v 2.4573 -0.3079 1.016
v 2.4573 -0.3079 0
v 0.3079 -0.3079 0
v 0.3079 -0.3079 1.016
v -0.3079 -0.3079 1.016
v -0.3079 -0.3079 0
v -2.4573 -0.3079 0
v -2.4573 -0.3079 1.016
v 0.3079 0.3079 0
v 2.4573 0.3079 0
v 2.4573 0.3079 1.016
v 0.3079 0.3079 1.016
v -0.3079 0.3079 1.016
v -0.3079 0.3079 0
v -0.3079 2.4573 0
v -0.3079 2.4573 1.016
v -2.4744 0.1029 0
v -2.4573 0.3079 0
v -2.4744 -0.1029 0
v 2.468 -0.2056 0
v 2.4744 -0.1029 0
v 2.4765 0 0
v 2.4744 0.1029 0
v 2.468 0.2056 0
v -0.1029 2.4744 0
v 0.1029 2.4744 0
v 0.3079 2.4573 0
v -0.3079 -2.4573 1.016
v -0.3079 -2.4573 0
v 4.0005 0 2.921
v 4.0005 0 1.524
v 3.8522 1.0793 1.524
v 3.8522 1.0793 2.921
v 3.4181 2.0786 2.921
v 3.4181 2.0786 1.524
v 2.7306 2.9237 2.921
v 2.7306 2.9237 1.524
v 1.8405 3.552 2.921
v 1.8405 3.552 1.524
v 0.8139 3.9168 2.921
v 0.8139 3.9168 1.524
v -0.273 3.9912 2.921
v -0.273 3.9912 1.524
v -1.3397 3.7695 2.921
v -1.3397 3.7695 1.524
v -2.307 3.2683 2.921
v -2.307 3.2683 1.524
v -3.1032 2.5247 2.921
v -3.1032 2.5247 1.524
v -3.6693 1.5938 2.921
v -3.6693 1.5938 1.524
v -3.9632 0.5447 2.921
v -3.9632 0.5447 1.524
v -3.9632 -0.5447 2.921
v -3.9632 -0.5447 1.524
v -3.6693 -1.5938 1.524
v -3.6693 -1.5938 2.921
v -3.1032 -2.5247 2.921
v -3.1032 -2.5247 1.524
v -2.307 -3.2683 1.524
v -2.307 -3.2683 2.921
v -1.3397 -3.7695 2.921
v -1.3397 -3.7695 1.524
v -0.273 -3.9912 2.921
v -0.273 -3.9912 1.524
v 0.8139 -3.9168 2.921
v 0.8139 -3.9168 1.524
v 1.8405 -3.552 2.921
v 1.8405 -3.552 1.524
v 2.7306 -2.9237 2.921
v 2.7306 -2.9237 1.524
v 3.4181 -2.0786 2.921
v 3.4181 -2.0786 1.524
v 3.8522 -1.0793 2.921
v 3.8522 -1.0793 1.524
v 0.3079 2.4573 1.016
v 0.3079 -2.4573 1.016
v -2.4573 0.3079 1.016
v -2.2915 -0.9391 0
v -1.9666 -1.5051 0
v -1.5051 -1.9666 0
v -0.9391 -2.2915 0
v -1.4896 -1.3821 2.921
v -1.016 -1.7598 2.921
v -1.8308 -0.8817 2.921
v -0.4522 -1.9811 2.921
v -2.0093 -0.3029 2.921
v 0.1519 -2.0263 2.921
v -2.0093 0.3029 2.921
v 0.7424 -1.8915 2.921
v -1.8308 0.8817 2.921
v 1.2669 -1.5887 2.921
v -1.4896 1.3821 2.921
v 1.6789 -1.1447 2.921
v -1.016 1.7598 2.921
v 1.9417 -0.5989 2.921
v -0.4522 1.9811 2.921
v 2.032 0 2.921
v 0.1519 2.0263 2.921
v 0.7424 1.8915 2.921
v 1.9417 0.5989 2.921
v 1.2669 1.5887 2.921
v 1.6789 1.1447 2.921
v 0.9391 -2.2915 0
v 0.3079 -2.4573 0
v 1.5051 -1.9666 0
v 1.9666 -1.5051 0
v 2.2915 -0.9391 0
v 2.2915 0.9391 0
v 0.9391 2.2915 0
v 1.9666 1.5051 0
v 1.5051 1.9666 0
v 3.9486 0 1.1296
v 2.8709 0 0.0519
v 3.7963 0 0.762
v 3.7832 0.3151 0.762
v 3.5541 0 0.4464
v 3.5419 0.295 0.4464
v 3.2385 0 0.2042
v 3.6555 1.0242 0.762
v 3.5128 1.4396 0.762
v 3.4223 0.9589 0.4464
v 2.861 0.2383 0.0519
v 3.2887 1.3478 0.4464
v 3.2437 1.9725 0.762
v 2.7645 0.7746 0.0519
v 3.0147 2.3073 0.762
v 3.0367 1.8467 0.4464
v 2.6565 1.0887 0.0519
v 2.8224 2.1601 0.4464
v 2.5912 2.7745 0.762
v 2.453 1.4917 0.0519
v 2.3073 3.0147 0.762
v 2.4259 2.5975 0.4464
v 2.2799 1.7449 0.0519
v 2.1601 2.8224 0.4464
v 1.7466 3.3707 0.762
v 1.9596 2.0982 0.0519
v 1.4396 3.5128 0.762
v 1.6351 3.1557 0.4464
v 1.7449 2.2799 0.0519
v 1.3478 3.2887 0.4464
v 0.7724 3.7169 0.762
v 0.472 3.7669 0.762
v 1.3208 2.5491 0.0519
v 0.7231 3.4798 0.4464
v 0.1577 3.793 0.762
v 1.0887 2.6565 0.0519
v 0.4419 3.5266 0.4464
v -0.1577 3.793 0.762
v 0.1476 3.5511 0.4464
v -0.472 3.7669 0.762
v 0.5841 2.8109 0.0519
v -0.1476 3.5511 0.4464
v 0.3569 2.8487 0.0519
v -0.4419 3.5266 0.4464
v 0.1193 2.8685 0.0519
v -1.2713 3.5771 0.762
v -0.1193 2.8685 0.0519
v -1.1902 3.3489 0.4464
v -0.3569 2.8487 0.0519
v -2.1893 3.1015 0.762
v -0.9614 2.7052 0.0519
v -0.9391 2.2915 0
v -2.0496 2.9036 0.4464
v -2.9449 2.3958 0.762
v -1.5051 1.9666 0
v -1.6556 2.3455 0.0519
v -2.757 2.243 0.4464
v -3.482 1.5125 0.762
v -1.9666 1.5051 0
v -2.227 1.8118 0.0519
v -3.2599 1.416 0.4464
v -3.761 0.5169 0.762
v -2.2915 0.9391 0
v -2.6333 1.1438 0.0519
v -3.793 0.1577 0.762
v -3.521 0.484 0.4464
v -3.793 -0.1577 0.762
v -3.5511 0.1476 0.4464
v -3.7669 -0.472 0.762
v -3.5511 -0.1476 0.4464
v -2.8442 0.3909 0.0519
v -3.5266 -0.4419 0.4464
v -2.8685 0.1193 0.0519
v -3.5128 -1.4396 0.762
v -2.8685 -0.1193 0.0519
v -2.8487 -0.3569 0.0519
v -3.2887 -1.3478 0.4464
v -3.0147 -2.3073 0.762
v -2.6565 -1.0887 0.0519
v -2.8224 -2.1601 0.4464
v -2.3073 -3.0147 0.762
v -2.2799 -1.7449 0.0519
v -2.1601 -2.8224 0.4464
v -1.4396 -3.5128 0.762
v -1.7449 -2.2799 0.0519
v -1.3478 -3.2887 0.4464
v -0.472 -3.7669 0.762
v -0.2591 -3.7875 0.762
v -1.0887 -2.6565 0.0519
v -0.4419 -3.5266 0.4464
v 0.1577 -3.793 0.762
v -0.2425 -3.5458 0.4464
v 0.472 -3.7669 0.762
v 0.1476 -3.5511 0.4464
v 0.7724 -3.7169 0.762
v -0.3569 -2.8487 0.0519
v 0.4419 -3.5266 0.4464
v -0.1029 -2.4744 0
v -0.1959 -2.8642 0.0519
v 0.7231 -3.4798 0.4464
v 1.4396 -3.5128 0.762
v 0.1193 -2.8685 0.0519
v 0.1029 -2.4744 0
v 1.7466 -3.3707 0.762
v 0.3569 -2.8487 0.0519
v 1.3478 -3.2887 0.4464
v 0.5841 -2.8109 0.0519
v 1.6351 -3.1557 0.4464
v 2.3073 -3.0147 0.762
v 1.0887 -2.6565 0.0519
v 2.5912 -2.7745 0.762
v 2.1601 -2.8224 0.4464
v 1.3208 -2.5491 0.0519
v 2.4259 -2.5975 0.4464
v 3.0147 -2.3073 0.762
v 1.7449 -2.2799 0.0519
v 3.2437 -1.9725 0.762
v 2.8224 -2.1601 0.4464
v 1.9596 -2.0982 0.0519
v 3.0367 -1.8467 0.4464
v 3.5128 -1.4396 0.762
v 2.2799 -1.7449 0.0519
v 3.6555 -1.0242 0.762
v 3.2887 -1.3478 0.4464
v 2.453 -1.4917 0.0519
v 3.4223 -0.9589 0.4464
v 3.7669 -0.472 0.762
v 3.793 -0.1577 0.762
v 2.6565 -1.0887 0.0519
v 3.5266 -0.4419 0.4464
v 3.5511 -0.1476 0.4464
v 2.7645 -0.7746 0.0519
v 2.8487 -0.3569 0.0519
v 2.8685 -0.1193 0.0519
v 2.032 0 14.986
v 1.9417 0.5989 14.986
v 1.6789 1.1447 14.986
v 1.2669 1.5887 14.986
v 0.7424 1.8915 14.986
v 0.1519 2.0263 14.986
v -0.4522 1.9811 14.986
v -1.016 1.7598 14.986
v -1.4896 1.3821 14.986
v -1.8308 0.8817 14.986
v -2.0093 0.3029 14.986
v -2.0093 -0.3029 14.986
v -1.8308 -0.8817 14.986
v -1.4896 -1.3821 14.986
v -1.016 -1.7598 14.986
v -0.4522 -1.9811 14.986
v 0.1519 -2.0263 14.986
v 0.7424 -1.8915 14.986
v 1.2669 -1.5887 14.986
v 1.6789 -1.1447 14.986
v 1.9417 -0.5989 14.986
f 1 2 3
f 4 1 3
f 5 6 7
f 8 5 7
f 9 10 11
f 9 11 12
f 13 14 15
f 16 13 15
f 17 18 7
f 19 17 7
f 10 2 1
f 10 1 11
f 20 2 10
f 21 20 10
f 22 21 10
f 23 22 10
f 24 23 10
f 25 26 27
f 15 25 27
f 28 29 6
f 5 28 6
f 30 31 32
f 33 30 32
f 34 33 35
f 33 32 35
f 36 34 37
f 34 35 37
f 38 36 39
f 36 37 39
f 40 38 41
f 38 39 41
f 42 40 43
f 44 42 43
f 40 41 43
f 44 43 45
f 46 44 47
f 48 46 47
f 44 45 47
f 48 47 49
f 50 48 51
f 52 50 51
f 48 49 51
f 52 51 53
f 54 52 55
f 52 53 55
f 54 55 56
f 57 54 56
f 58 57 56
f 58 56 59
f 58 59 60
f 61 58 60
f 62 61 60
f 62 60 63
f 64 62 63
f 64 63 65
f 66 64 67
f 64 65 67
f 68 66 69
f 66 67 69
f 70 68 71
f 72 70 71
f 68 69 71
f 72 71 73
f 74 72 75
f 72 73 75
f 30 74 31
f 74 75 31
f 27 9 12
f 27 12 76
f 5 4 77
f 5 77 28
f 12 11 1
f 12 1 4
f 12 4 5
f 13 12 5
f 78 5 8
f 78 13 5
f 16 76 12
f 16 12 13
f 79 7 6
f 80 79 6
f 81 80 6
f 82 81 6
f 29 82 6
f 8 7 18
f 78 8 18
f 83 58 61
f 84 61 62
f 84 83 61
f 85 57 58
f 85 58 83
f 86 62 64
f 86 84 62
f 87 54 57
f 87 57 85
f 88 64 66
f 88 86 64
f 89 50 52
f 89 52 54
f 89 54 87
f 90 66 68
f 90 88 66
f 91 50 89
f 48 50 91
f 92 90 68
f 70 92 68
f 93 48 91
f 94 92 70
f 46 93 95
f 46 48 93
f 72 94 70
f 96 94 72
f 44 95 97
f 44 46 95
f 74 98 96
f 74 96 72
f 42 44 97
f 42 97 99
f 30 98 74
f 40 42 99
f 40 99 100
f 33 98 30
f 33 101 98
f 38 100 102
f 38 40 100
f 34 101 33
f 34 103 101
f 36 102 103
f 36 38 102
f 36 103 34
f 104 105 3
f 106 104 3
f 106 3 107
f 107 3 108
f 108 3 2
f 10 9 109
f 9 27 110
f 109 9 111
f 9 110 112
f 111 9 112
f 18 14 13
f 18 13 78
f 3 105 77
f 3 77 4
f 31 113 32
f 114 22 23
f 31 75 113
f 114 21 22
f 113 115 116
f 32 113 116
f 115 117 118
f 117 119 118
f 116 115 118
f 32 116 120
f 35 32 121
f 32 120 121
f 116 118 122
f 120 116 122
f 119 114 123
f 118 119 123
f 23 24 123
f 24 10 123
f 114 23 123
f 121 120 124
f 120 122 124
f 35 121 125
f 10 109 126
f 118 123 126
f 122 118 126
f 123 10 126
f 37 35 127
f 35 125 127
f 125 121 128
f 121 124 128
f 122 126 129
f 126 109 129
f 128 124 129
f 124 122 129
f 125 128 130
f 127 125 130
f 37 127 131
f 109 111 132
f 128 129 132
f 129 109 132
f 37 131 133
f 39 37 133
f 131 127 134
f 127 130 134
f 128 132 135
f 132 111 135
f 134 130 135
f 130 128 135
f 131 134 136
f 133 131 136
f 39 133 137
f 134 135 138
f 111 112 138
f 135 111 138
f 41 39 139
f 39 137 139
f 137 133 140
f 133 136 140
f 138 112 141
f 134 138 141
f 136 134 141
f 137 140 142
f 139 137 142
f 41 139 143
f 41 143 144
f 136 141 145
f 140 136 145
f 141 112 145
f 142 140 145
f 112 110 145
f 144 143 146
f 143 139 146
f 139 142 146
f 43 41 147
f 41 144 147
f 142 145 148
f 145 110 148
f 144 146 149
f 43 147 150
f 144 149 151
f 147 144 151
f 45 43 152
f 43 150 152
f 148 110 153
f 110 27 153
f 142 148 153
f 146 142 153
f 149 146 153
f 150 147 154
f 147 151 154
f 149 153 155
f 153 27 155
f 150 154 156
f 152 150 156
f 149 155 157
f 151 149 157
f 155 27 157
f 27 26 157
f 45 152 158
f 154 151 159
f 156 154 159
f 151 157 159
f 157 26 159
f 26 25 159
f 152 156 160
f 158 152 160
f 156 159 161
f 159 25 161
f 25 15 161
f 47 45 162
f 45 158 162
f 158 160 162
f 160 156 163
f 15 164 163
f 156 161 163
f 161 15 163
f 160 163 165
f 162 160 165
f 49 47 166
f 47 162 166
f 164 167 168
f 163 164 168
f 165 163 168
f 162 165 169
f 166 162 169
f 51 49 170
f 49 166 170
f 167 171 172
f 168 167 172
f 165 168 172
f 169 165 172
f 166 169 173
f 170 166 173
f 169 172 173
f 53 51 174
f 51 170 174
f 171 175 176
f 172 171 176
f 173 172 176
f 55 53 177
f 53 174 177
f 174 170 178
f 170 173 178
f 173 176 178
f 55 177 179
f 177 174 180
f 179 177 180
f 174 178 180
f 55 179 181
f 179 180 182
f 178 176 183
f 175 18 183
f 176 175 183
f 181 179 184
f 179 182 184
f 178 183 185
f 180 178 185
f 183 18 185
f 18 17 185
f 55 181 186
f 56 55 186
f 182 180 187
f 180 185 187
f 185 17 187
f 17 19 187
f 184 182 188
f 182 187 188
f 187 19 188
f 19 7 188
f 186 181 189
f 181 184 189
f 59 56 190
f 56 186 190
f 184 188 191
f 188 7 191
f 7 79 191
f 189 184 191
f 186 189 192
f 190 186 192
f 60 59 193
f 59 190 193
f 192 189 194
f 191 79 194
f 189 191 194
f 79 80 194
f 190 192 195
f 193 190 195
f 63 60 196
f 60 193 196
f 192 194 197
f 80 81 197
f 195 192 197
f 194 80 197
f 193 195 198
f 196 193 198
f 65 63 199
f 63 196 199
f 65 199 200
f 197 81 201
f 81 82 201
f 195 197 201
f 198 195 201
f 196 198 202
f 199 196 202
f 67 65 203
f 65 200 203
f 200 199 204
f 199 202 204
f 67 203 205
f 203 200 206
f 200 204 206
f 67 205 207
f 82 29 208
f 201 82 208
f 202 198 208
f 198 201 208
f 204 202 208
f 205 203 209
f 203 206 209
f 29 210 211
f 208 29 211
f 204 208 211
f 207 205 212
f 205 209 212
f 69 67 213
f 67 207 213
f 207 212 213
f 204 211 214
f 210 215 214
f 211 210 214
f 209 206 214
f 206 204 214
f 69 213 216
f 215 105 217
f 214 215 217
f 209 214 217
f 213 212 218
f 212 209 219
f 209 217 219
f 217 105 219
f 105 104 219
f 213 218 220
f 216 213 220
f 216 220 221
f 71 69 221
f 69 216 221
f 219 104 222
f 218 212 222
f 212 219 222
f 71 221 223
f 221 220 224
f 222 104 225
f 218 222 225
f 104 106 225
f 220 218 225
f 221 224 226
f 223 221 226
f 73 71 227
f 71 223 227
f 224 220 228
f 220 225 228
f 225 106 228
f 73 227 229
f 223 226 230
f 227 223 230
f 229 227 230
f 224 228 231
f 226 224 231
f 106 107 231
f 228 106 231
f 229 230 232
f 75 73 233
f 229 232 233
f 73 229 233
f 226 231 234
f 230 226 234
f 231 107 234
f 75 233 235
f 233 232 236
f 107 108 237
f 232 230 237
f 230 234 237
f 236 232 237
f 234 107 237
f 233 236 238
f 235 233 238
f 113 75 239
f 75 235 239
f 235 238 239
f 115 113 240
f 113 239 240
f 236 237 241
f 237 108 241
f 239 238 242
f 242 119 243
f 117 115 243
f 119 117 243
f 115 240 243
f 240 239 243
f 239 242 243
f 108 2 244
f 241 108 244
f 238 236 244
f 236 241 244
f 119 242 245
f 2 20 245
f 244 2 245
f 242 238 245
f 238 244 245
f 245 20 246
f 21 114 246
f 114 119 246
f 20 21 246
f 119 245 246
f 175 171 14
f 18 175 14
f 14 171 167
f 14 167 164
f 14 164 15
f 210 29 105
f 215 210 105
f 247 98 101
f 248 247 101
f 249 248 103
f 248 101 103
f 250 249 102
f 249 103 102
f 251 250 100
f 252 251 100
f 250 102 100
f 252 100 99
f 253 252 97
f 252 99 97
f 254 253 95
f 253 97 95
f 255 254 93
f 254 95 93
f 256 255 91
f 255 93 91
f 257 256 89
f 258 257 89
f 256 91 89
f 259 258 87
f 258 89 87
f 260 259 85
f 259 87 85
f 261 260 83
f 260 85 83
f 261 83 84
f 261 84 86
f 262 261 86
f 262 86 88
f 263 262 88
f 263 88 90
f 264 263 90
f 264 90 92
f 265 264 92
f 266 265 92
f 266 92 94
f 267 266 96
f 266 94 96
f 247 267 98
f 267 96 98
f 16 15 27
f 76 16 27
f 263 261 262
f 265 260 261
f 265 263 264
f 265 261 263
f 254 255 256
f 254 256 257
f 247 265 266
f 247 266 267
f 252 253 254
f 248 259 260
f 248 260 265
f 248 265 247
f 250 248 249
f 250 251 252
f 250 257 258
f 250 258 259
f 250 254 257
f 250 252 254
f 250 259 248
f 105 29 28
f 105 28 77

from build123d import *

# Parameters (mm, degrees)
SKETCH1_R         = 4.0005
EXTRUDE1_DEPTH    = 2.921
FILLET1_R         = 1.524
SKETCH2_R         = 2.032
EXTRUDE2_DEPTH    = 12.065
SKETCH3_W         = 4.91456988
SKETCH3_H         = 0.615801824
EXTRUDE3_DEPTH    = 1.016
CIRPATTERN1_COUNT = 2
CIRPATTERN1_ANGLE = 90


with BuildPart() as part:
    # Sketch1 → Extrude1 (new body)
    with BuildSketch(Plane.XY):
        Circle(SKETCH1_R)
    extrude(amount=EXTRUDE1_DEPTH)

    # Fillet1
    fillet1_edges = [part.edges().sort_by_distance(p)[0] for p in [
        (-4.0005, 0, 0),
    ]]
    fillet(fillet1_edges, radius=FILLET1_R)

    # Sketch2 → Extrude2 (add)
    with BuildSketch(Plane.XY.offset(2.921)):
        Circle(SKETCH2_R)
    extrude(amount=EXTRUDE2_DEPTH)

    # Sketch3 → Extrude3 (cut)
    with BuildSketch(Plane(origin=(0, 0, 0), x_dir=(-1, 0, 0), z_dir=(0, 0, -1))):
        Rectangle(SKETCH3_W, SKETCH3_H)
    extrude3 = extrude(amount=-EXTRUDE3_DEPTH, mode=Mode.SUBTRACT)

    # CirPattern1: Extrude3 ×2 about axis
    cirpattern1_axis = Axis((0, 0, 0), (0, 0, -1))
    for i in range(1, CIRPATTERN1_COUNT):
        add(extrude3.rotate(cirpattern1_axis, i * CIRPATTERN1_ANGLE / (CIRPATTERN1_COUNT - 1)), mode=Mode.SUBTRACT)


solid = part.part
